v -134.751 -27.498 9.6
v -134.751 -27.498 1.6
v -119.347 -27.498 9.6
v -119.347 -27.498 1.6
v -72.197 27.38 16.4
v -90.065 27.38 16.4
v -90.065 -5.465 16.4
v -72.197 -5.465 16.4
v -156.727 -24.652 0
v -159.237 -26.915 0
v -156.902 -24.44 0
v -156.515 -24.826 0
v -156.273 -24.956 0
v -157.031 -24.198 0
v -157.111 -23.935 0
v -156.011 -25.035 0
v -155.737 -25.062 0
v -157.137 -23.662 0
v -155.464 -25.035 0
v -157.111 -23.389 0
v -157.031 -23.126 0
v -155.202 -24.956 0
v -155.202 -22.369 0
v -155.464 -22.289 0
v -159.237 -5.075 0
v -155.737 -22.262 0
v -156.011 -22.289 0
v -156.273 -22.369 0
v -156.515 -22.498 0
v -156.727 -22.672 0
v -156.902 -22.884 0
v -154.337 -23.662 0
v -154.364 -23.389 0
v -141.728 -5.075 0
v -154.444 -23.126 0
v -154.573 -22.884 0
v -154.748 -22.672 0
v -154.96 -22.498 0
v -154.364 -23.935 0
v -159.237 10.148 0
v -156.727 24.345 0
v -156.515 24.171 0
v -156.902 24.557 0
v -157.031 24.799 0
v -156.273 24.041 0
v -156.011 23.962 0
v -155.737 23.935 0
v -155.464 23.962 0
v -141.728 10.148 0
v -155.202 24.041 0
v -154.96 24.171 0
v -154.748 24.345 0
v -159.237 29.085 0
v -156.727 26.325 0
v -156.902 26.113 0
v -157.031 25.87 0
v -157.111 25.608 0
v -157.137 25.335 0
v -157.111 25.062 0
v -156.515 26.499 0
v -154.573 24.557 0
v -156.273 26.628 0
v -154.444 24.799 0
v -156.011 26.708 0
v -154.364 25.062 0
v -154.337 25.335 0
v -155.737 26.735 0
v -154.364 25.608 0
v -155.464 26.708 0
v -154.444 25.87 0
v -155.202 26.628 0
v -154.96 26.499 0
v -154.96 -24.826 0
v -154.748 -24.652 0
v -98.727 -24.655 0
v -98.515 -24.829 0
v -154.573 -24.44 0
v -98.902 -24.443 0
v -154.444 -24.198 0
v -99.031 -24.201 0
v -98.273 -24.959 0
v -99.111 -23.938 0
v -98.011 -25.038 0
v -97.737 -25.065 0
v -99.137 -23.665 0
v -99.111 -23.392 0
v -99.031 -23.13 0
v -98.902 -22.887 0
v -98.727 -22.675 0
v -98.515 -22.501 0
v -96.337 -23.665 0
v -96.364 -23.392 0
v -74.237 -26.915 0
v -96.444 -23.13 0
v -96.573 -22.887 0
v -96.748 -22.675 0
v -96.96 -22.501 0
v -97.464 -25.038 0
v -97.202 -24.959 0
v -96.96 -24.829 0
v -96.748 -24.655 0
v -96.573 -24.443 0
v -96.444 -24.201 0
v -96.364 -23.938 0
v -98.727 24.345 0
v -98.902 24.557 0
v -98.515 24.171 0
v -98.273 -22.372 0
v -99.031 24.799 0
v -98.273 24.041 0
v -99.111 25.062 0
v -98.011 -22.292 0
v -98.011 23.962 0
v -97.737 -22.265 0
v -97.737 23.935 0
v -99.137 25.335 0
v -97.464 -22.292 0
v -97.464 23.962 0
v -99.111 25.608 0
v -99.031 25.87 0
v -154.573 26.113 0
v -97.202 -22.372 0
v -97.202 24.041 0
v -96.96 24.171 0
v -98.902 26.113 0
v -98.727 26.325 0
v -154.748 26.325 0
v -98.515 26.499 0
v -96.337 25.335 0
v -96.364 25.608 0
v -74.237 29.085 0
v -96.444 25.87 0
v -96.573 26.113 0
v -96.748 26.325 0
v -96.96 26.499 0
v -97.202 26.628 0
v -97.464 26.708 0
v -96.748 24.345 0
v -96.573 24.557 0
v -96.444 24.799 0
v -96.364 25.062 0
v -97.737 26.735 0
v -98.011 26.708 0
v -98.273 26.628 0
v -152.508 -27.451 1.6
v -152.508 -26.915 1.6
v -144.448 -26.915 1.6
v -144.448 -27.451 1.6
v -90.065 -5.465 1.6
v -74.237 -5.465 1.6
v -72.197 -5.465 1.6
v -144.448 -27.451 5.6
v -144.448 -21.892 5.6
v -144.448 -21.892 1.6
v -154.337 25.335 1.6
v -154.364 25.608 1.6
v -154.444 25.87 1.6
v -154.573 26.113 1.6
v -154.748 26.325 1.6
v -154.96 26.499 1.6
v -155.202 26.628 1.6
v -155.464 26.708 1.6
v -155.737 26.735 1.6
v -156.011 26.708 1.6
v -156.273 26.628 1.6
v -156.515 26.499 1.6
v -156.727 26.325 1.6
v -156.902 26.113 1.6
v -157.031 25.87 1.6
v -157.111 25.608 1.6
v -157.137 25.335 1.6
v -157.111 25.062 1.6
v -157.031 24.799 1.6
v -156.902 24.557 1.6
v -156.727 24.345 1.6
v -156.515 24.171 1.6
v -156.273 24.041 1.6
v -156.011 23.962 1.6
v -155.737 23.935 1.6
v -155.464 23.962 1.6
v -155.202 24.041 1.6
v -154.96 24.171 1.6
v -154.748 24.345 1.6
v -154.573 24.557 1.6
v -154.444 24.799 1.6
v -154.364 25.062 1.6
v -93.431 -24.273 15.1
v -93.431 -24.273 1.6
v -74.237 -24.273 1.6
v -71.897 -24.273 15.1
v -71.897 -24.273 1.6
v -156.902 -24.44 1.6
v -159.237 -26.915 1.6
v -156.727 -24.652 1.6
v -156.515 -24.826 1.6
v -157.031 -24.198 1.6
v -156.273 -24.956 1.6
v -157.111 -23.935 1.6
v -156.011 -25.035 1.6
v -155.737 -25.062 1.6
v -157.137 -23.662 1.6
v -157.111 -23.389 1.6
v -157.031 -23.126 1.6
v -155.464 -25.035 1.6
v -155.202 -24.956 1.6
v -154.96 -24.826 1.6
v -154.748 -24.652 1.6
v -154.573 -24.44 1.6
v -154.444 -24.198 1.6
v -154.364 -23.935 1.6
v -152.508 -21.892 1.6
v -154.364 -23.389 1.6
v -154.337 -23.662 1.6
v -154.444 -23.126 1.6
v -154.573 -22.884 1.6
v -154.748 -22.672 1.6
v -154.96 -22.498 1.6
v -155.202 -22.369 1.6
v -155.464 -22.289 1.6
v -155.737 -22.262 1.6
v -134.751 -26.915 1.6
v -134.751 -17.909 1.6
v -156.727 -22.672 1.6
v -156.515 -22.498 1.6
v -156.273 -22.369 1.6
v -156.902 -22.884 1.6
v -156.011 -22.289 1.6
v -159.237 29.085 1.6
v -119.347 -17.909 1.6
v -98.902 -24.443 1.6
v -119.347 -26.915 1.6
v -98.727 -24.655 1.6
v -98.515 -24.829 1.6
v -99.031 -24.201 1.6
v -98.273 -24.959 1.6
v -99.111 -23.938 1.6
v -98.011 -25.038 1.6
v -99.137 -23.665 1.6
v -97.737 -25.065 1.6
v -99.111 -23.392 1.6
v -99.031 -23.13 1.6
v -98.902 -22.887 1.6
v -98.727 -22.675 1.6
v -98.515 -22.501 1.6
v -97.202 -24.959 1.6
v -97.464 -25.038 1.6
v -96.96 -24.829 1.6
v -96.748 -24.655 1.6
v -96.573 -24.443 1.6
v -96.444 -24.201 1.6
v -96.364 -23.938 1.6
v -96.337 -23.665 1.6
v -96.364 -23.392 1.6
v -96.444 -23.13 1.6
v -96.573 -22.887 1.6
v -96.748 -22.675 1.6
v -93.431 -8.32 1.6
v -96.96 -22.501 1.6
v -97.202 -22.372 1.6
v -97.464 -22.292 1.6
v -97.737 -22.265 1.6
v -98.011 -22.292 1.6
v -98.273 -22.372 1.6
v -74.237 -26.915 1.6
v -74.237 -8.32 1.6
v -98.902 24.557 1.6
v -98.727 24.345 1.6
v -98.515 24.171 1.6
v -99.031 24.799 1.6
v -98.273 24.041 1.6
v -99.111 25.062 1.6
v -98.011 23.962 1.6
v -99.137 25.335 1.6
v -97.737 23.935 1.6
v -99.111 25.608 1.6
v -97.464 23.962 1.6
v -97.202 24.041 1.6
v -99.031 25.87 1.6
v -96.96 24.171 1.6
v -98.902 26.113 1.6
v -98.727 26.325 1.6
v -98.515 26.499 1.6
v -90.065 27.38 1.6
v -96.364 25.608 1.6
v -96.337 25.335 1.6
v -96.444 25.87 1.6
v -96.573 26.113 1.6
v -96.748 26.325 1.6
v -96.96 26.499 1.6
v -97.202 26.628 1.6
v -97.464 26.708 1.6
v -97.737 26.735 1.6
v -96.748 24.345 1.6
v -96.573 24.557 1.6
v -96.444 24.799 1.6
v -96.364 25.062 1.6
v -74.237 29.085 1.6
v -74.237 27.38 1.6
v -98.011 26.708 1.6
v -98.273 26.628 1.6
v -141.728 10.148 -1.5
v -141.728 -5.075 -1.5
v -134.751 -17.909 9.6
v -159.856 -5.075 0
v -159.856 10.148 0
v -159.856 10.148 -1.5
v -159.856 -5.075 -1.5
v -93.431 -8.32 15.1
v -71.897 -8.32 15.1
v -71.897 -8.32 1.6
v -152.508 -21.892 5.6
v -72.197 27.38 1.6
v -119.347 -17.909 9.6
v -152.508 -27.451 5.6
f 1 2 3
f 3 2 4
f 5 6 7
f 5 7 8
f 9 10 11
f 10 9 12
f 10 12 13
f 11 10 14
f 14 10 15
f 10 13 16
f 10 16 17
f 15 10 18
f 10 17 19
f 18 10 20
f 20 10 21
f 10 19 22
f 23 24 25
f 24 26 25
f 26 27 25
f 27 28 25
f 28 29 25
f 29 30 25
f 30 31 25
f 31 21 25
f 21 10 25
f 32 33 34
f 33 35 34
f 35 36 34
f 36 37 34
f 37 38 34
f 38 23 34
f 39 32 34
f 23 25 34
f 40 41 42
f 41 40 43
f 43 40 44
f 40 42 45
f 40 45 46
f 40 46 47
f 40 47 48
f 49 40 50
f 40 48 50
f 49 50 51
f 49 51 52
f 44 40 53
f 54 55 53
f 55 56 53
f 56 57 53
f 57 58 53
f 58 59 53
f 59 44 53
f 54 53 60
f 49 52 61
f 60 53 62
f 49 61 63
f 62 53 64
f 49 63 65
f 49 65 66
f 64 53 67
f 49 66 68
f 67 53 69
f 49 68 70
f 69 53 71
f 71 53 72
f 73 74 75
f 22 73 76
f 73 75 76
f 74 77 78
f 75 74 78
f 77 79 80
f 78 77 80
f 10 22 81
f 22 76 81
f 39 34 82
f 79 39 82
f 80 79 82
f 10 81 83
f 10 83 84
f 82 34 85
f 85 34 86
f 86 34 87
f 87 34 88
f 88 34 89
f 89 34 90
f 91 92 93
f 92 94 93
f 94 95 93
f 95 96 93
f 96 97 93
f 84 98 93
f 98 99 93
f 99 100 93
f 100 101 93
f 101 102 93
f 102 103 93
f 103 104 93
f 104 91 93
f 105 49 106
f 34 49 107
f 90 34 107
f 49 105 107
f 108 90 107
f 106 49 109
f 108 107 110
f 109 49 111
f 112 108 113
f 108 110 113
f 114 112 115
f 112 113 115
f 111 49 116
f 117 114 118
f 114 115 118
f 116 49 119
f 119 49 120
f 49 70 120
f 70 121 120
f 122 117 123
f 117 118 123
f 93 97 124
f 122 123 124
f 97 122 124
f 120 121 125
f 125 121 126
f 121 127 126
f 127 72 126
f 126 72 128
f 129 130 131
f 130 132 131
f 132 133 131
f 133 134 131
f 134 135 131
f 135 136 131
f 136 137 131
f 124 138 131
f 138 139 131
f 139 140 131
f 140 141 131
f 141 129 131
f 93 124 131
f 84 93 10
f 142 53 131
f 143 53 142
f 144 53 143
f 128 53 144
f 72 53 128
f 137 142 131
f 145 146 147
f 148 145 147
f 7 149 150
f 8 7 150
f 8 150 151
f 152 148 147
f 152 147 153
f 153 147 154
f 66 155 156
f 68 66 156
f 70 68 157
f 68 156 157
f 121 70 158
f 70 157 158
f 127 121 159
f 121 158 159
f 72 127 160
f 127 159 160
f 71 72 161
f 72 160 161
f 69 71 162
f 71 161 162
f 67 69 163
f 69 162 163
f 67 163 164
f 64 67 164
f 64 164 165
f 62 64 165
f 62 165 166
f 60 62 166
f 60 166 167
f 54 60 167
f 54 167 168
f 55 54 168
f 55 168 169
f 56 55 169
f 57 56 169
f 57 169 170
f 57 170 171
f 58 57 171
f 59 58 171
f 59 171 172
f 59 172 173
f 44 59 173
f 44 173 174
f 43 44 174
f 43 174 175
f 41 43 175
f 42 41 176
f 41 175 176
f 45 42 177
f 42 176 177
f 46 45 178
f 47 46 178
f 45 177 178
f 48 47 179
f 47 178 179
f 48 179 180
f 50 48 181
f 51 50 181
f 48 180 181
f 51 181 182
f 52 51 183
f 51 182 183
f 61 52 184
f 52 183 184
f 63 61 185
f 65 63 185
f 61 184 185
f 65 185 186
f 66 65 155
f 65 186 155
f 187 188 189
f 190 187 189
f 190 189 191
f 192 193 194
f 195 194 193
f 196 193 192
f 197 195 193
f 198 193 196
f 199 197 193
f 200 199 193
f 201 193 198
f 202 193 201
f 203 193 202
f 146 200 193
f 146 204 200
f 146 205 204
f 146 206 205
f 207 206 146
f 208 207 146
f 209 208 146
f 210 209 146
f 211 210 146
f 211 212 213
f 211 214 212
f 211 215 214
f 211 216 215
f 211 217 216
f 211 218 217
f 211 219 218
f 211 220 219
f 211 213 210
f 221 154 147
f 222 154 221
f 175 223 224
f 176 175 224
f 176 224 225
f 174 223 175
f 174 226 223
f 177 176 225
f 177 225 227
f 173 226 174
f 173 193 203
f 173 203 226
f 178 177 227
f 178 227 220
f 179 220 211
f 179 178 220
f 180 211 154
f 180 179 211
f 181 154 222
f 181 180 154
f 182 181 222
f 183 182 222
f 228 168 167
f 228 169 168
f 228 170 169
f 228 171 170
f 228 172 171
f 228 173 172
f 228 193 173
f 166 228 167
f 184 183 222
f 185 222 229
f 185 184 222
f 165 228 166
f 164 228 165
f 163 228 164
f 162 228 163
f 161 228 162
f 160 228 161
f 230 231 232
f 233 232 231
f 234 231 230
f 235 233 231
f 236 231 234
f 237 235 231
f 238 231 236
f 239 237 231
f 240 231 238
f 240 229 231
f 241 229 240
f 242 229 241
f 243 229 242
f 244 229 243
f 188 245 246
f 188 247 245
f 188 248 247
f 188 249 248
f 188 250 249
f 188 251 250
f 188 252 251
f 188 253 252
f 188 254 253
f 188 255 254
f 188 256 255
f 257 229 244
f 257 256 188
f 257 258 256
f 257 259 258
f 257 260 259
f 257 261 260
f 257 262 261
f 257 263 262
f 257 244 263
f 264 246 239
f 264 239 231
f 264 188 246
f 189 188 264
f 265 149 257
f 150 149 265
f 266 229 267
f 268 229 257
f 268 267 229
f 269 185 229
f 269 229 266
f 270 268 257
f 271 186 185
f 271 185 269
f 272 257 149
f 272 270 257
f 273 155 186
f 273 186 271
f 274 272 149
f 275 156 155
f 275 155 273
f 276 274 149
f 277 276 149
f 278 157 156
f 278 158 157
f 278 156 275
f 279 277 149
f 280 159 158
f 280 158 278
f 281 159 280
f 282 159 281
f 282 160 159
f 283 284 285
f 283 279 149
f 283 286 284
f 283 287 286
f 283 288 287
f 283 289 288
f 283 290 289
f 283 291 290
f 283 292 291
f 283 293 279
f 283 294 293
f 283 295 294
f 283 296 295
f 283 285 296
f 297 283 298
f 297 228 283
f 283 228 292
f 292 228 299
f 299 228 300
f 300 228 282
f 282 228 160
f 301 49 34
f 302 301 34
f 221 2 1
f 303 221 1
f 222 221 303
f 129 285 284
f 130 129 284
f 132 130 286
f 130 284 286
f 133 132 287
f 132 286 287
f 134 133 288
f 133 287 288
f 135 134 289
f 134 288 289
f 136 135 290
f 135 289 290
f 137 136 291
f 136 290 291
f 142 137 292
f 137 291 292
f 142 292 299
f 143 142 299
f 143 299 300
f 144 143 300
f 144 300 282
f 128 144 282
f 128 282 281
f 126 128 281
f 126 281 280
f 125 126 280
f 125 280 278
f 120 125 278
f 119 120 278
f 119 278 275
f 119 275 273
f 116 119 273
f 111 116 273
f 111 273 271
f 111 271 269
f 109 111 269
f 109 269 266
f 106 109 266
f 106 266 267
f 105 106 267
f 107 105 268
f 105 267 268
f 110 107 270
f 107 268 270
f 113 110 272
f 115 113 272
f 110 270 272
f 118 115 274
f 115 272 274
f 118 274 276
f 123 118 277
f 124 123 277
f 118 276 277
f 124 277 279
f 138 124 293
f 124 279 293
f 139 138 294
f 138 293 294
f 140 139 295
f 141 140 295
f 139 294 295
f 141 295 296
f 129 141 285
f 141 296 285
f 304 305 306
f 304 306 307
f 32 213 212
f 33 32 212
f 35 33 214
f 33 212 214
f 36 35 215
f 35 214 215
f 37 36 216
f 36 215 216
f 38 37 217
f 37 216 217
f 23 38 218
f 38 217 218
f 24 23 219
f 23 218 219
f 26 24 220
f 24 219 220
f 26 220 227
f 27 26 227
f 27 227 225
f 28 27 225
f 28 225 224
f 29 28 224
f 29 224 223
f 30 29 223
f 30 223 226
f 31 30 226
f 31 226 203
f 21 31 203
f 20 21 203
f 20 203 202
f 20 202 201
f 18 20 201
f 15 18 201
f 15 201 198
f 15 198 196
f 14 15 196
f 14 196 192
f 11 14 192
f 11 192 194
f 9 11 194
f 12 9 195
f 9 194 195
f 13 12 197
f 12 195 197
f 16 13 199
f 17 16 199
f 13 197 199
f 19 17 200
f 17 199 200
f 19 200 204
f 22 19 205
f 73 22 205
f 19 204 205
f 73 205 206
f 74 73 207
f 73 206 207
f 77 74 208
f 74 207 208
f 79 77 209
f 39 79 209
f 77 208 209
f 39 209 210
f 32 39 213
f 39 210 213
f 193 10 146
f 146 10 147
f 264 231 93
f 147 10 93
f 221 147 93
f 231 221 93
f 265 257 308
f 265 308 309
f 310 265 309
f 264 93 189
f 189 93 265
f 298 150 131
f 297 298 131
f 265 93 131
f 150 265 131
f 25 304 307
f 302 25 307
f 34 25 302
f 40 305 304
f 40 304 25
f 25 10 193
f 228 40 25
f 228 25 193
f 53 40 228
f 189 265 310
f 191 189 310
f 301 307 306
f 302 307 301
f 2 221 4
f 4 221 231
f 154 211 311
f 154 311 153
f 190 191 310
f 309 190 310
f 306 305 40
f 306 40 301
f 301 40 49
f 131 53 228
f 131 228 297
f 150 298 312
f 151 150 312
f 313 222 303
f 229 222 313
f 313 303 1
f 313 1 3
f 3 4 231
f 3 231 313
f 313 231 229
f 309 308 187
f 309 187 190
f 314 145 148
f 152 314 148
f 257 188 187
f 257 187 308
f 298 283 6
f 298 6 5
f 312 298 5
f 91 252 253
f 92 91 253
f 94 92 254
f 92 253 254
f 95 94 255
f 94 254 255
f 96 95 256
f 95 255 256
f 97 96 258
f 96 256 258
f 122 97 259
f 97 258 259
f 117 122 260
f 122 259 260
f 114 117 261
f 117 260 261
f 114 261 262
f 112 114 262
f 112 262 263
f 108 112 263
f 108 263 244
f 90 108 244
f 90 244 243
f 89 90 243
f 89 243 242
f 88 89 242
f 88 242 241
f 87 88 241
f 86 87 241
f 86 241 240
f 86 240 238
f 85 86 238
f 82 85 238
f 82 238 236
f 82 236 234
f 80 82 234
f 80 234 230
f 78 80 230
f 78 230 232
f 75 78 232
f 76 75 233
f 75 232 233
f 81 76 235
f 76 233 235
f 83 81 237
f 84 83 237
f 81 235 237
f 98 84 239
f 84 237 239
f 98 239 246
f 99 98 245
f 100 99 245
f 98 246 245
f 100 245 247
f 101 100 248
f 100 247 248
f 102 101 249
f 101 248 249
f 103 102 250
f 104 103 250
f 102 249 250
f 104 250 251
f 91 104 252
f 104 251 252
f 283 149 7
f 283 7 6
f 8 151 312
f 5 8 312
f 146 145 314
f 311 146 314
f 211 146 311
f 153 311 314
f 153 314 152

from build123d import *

# Parameters (mm, degrees)
SKETCH_W     = 85
SKETCH_H     = 56
PAD_DEPTH    = 1.6
SKETCH001_R  = 1.4
POCKET_DEPTH = 5
SKETCH002_W  = 17.867575
SKETCH002_H  = 32.844936
PAD001_DEPTH = 14.8
SKETCH003_W  = 21.533829
SKETCH003_H  = 15.952719
PAD002_DEPTH = 13.5
SKETCH004_W  = 18.128704
SKETCH004_H  = 15.222443
PAD003_DEPTH = 1.5
SKETCH005_W  = 8.059815
SKETCH005_H  = 5.559658
PAD004_DEPTH = 4
SKETCH006_W  = 15.403427
SKETCH006_H  = 9.588475
PAD005_DEPTH = 8


with BuildPart() as pad001:
    # Sketch → Pad (new body)
    with BuildSketch(Plane.XY):
        with Locations((-116.737486, 1.084726)):
            Rectangle(SKETCH_W, SKETCH_H)
    extrude(amount=PAD_DEPTH)

    # Sketch001 → Pocket (cut)
    with BuildSketch(Plane.XY.offset(1.6)):
        with Locations((-155.737486, 25.334726)):
            Circle(SKETCH001_R)
        with Locations((-97.737486, 25.334726)):
            Circle(SKETCH001_R)
        with Locations((-97.737486, -23.665274)):
            Circle(SKETCH001_R)
        with Locations((-155.737488, -23.662172)):
            Circle(SKETCH001_R)
    extrude(amount=-POCKET_DEPTH, mode=Mode.SUBTRACT)

    # Sketch002 → Pad001 (new body)
    with BuildSketch(Plane.XY.offset(1.6)):
        with Locations((-81.131173, 10.957084)):
            Rectangle(SKETCH002_W, SKETCH002_H)
    extrude(amount=PAD001_DEPTH)


with BuildPart() as pad004:
    # Pad002 base: copy of Pad001
    add(pad001.part)

    # Sketch003 → Pad002 (new body)
    with BuildSketch(Plane.XY.offset(1.6)):
        with Locations((-82.664124, -16.296502)):
            Rectangle(SKETCH003_W, SKETCH003_H)
    extrude(amount=PAD002_DEPTH)

    # Sketch004 → Pad003 (new body)
    with BuildSketch(Plane(origin=(0, 0, 0), x_dir=(1, 0, 0), z_dir=(0, 0, -1))):
        with Locations((-150.791951, -2.536587)):
            Rectangle(SKETCH004_W, SKETCH004_H)
    extrude(amount=PAD003_DEPTH)

    # Sketch005 → Pad004 (new body)
    with BuildSketch(Plane.XY.offset(1.6)):
        with Locations((-148.477616, -24.671362)):
            Rectangle(SKETCH005_W, SKETCH005_H)
    extrude(amount=PAD004_DEPTH)


with BuildPart() as fusion:
    # Pad005 base: copy of Pad004
    add(pad004.part)

    # Sketch006 → Pad005 (new body)
    with BuildSketch(Plane.XY.offset(1.6)):
        with Locations((-127.049156, -22.703693)):
            Rectangle(SKETCH006_W, SKETCH006_H)
    extrude(amount=PAD005_DEPTH)

    # Fusion: union Pad001, Pad004
    add(pad001.part)
    add(pad004.part)


solid = fusion.part
